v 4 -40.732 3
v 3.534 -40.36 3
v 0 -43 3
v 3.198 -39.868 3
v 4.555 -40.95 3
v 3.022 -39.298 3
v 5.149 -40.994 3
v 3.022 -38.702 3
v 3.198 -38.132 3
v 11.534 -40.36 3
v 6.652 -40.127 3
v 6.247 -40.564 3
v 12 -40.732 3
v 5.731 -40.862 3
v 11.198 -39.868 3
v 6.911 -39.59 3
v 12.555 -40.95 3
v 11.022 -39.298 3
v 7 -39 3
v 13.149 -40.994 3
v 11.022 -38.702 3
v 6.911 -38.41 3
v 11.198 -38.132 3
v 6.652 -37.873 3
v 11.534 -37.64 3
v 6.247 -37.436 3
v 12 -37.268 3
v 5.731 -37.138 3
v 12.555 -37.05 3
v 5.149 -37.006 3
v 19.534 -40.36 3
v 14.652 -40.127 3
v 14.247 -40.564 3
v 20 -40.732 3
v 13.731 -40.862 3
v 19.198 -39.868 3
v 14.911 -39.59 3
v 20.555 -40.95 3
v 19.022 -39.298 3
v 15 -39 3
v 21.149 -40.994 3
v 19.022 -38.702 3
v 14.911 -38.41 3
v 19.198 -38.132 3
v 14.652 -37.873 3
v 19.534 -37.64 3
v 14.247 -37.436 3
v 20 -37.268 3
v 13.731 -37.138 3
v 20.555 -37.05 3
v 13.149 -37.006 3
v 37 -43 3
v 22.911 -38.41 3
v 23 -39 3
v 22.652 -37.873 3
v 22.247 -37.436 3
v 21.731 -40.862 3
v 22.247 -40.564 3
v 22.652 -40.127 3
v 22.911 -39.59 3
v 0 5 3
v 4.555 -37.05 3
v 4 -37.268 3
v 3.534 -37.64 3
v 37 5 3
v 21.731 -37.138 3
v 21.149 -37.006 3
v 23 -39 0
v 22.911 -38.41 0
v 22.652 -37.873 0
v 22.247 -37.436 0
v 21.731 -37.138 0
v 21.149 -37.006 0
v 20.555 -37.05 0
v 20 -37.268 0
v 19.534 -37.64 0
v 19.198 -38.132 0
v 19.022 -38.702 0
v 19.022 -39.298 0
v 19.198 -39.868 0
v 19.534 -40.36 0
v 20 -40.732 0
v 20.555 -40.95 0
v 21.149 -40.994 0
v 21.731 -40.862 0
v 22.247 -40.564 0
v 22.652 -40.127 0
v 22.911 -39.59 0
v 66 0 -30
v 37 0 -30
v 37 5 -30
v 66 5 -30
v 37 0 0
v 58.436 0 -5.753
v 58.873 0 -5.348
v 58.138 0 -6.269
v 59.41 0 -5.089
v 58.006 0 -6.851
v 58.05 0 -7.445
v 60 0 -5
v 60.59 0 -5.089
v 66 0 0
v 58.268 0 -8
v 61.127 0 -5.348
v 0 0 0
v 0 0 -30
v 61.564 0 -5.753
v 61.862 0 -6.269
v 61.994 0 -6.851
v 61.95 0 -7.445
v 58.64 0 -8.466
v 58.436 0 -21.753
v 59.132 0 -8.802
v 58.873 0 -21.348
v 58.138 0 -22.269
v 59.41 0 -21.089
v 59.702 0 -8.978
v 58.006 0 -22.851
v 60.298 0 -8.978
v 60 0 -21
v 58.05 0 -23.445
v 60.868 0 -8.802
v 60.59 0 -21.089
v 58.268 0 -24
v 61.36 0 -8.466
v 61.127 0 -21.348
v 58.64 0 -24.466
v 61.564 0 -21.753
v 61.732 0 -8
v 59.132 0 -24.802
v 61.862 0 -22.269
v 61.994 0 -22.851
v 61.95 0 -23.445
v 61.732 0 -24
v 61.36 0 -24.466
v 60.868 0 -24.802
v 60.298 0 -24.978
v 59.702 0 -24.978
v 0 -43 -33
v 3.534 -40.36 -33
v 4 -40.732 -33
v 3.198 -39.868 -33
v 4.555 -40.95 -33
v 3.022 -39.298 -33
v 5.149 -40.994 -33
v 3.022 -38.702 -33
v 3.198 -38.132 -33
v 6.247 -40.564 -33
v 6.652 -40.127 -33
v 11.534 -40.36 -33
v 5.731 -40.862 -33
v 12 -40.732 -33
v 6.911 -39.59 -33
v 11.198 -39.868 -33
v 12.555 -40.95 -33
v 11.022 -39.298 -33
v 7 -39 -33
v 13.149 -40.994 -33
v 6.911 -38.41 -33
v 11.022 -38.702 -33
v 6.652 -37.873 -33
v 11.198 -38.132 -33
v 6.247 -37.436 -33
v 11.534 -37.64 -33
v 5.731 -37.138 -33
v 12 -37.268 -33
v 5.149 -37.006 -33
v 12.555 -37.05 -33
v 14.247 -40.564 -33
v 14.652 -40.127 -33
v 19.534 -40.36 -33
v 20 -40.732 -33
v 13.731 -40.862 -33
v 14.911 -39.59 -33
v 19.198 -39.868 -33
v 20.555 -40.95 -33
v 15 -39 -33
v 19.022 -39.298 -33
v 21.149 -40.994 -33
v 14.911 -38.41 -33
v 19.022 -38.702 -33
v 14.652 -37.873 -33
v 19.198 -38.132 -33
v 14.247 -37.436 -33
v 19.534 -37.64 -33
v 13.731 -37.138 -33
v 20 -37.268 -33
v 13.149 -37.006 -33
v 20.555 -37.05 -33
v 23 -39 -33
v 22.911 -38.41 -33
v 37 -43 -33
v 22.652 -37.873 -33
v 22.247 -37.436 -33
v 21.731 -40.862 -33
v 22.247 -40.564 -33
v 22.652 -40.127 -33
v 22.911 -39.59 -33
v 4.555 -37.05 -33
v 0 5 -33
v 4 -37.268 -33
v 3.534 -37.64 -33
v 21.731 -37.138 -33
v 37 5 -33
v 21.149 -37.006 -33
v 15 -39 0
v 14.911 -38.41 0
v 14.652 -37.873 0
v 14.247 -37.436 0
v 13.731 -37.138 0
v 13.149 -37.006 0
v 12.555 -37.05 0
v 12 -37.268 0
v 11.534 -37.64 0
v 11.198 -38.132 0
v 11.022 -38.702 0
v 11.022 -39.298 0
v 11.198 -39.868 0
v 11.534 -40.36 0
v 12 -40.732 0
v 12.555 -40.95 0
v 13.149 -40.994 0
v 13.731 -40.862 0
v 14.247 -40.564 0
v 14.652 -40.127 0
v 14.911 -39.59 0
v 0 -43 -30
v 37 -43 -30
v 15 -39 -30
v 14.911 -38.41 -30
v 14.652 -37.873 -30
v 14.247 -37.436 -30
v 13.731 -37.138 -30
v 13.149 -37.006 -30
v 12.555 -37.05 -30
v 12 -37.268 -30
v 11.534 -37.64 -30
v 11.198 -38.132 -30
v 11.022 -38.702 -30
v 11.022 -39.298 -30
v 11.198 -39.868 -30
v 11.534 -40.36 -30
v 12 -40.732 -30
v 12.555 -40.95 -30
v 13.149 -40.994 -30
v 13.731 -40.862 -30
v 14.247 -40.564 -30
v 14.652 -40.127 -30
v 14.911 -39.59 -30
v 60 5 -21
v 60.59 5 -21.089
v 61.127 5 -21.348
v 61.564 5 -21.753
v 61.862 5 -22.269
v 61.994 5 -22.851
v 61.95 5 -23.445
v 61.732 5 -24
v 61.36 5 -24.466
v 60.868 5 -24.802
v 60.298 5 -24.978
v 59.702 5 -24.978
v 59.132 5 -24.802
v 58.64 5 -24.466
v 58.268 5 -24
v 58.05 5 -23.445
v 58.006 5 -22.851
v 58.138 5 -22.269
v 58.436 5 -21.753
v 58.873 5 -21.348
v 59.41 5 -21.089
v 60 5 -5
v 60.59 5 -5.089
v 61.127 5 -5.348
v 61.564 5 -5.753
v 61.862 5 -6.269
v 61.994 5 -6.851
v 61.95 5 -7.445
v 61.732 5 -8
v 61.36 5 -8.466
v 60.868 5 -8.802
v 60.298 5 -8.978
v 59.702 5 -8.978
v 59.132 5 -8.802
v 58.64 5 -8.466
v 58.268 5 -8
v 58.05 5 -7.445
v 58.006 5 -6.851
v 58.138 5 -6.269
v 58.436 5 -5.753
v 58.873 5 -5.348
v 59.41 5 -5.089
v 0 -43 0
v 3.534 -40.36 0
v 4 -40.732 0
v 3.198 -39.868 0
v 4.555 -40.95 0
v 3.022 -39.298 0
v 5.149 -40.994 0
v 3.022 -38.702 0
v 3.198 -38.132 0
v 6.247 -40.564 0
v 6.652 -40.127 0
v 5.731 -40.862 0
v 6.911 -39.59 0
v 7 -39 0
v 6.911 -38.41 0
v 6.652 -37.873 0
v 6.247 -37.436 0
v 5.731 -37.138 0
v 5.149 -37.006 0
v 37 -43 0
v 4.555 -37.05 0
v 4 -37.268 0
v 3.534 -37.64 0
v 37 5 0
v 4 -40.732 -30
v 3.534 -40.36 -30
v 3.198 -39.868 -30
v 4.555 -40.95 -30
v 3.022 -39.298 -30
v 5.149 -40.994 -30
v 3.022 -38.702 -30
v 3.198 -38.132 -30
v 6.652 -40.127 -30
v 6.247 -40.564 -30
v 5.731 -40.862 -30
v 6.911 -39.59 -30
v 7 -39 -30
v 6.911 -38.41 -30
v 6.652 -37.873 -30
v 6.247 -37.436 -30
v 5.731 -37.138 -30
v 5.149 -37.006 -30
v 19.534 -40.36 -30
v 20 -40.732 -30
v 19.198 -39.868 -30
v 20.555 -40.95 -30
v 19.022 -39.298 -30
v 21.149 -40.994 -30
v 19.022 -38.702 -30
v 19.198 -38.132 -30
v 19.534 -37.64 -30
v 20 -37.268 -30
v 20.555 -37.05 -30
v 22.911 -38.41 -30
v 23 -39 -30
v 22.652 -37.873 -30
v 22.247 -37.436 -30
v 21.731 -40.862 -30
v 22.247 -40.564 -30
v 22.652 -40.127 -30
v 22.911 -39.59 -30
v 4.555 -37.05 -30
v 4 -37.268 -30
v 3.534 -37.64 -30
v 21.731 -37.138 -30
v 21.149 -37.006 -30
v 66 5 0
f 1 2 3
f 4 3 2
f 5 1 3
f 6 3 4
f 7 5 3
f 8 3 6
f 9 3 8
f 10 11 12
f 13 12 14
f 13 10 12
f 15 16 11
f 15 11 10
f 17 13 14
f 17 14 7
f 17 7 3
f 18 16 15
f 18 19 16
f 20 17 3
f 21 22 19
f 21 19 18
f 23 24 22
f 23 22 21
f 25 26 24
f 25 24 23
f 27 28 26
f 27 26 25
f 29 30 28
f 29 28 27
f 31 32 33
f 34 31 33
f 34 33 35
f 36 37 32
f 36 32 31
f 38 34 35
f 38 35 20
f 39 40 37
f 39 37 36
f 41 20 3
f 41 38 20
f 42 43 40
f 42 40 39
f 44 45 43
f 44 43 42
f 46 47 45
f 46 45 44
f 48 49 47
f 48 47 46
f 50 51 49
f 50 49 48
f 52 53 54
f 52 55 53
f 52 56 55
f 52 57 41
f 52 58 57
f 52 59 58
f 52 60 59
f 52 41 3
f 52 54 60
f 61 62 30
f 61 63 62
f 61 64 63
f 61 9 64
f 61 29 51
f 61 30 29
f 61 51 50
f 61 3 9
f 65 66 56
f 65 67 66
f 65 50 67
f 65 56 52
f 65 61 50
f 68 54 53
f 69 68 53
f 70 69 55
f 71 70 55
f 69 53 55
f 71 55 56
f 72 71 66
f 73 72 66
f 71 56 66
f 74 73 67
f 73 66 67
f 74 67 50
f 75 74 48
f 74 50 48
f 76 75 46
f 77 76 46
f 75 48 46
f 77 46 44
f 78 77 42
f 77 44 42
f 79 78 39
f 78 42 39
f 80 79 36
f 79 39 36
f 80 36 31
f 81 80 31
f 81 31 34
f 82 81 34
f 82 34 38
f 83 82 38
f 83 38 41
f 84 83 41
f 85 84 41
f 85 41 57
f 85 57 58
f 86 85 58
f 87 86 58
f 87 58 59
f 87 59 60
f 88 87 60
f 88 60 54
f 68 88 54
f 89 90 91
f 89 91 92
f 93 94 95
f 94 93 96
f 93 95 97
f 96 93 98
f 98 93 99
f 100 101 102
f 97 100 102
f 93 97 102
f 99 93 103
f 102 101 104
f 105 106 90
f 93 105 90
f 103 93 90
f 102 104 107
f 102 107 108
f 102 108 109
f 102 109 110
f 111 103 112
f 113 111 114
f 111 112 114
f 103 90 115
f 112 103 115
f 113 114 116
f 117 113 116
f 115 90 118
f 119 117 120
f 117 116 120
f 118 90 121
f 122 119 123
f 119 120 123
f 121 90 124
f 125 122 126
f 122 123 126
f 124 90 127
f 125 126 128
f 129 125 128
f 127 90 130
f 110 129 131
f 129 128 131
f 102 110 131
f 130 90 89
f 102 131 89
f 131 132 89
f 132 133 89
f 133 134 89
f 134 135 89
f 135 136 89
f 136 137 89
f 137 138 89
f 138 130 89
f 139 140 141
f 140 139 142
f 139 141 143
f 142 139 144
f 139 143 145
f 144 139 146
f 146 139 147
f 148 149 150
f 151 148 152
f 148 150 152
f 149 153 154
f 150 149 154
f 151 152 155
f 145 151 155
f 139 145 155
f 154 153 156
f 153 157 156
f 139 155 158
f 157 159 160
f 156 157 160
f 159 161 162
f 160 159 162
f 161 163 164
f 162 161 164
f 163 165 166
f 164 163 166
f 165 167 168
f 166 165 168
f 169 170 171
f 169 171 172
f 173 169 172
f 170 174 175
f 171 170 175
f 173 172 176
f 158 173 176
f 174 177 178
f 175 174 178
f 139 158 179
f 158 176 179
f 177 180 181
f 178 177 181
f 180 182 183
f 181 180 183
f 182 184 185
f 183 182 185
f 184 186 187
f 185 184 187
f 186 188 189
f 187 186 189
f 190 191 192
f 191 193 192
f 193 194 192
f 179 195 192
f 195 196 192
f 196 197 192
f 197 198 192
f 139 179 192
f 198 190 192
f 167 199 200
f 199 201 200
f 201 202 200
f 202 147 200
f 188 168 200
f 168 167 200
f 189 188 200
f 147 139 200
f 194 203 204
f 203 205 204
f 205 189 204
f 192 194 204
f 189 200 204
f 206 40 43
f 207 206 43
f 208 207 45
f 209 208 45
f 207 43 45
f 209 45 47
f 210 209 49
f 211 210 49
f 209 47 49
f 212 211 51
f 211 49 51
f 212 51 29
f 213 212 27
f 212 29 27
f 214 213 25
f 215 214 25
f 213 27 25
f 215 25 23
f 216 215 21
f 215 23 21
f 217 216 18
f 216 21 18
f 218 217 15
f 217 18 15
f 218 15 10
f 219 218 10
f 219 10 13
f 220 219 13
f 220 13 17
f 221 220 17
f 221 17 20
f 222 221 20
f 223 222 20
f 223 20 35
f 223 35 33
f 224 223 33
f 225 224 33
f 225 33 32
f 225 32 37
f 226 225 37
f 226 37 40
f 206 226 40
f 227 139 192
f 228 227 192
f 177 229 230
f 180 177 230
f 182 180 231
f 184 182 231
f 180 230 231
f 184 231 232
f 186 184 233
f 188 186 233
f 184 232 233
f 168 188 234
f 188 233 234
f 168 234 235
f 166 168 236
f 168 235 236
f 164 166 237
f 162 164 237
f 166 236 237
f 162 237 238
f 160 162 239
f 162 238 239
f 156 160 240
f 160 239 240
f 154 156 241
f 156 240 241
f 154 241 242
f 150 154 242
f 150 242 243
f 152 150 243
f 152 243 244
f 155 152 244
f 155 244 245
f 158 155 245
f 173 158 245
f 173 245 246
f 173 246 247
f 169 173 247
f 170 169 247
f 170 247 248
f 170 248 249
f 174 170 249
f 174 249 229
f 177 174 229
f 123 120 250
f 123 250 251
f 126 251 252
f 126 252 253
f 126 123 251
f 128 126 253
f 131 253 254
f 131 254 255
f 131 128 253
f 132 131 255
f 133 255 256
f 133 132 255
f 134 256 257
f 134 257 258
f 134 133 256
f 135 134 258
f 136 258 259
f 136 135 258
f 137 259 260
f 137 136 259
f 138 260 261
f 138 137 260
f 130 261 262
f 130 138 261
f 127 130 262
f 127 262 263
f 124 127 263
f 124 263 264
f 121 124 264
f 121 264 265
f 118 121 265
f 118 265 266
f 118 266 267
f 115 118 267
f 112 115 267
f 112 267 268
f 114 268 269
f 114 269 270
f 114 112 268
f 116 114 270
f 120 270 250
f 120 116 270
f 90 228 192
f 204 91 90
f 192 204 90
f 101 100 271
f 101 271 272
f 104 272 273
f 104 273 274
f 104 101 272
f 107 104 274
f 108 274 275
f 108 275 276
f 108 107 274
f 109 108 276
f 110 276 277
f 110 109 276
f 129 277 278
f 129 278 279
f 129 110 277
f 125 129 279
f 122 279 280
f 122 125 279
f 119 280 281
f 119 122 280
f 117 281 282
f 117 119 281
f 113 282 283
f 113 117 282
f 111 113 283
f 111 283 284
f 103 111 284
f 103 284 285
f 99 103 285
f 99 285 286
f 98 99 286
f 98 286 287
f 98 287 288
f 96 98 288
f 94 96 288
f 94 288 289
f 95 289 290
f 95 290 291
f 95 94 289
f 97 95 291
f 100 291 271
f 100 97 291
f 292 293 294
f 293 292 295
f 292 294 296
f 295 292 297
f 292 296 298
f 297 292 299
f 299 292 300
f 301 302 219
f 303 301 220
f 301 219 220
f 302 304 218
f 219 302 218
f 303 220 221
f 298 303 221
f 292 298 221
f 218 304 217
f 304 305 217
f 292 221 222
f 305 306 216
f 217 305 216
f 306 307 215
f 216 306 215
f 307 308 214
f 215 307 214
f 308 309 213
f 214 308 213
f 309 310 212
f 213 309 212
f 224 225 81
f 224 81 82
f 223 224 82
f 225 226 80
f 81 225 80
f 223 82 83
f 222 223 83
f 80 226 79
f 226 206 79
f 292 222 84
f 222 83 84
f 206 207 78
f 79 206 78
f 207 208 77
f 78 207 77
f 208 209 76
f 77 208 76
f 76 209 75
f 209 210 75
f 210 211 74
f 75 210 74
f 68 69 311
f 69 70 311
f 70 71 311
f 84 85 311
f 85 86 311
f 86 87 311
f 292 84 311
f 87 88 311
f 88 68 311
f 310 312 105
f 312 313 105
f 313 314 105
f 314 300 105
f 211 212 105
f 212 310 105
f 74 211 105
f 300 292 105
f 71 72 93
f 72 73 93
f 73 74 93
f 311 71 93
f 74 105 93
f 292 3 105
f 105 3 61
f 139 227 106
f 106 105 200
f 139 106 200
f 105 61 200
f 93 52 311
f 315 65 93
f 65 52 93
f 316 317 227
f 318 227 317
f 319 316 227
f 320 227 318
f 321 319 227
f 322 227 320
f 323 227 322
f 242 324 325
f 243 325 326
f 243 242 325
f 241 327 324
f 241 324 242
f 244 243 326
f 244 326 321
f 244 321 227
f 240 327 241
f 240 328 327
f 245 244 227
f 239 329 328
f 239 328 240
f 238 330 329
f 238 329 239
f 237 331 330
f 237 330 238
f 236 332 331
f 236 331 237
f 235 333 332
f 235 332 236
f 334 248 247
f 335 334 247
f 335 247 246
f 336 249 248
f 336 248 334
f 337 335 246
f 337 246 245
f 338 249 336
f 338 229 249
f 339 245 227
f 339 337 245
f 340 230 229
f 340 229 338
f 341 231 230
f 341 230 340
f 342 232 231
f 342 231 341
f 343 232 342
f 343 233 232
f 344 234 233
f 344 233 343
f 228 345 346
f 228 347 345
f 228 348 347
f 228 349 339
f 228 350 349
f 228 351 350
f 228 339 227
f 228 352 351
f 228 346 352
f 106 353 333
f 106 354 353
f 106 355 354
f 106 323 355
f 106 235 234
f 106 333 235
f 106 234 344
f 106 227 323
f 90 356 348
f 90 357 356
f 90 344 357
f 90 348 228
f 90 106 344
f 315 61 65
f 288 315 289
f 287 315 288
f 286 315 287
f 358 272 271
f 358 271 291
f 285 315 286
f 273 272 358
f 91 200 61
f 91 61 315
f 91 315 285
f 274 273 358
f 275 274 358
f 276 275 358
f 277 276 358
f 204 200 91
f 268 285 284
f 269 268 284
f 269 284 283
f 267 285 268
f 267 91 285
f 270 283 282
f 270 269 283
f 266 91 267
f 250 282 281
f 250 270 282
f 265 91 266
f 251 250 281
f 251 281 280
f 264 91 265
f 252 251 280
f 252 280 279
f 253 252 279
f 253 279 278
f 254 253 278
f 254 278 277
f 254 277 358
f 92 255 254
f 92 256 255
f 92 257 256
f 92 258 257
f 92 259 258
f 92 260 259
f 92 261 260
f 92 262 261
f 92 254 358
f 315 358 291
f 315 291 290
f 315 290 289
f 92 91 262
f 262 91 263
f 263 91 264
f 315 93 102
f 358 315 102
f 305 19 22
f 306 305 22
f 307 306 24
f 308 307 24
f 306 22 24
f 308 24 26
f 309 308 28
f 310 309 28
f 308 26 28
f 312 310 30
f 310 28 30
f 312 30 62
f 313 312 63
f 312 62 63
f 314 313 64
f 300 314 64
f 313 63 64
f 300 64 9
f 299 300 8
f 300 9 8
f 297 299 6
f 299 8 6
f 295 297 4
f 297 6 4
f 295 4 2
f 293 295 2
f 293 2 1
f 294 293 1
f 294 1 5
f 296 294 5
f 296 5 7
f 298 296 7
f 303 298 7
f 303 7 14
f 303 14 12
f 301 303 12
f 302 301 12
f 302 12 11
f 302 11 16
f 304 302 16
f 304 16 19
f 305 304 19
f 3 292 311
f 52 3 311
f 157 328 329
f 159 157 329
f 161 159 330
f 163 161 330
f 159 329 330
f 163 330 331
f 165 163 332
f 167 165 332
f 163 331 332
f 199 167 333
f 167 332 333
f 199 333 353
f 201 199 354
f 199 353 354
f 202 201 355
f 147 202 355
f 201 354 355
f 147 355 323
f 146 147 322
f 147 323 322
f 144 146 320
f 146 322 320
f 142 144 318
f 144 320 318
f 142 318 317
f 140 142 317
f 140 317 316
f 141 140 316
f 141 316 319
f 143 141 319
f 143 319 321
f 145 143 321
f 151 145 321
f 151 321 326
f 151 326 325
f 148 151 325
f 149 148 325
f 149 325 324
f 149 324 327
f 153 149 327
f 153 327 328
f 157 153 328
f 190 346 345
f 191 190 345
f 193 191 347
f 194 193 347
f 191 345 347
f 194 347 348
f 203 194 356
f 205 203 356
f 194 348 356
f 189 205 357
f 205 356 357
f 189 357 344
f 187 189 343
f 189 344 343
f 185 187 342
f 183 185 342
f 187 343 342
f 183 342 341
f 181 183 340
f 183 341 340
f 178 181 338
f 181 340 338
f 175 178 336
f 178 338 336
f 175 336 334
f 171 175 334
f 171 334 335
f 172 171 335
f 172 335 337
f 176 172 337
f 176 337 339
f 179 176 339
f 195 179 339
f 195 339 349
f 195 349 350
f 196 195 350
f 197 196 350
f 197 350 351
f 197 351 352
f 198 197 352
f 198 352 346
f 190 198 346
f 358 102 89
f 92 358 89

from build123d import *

# Parameters (mm, degrees)
SKETCH_1_W          = 66
SKETCH_1_H          = 30
SKETCH_1_R          = 2
EXTRUDE_1_DEPTH     = 5
SKETCH_2_W          = 37
SKETCH_2_H          = 3
EXTRUDE_2_DEPTH     = 48
SKETCH_3_R          = 2
CUT_EXTRUDE_2_DEPTH = 44


with BuildPart() as part:
    # 草圖1 → 填料-伸長1 (new body)
    with BuildSketch(Plane(origin=(0, 0, 0), x_dir=(1, 0, 0), z_dir=(0, 1, 0))):
        with Locations((33, 15)):
            Rectangle(SKETCH_1_W, SKETCH_1_H)
        with Locations(Location((60, 23, 0), (0, 0, 270))):
            Circle(SKETCH_1_R, mode=Mode.SUBTRACT)
        with Locations(Location((60, 7, 0), (0, 0, 270))):
            Circle(SKETCH_1_R, mode=Mode.SUBTRACT)
    extrude(amount=EXTRUDE_1_DEPTH)

    # 草圖2 → 填料-伸長2 (add)
    with BuildSketch(Plane(origin=(0, 5, 0), x_dir=(1, 0, 0), z_dir=(0, 1, 0))):
        with Locations((18.5, 31.5)):
            Rectangle(SKETCH_2_W, SKETCH_2_H)
        with Locations((18.5, -1.5)):
            Rectangle(SKETCH_2_W, SKETCH_2_H)
    extrude(amount=-EXTRUDE_2_DEPTH)

    # 草圖3 → 除料-伸長2 (cut)
    with BuildSketch(Plane.XY.offset(3)):
        with Locations((21, -39)):
            Circle(SKETCH_3_R)
        with Locations((13, -39)):
            Circle(SKETCH_3_R)
        with Locations((5, -39)):
            Circle(SKETCH_3_R)
    extrude(amount=-CUT_EXTRUDE_2_DEPTH, mode=Mode.SUBTRACT)


solid = part.part
